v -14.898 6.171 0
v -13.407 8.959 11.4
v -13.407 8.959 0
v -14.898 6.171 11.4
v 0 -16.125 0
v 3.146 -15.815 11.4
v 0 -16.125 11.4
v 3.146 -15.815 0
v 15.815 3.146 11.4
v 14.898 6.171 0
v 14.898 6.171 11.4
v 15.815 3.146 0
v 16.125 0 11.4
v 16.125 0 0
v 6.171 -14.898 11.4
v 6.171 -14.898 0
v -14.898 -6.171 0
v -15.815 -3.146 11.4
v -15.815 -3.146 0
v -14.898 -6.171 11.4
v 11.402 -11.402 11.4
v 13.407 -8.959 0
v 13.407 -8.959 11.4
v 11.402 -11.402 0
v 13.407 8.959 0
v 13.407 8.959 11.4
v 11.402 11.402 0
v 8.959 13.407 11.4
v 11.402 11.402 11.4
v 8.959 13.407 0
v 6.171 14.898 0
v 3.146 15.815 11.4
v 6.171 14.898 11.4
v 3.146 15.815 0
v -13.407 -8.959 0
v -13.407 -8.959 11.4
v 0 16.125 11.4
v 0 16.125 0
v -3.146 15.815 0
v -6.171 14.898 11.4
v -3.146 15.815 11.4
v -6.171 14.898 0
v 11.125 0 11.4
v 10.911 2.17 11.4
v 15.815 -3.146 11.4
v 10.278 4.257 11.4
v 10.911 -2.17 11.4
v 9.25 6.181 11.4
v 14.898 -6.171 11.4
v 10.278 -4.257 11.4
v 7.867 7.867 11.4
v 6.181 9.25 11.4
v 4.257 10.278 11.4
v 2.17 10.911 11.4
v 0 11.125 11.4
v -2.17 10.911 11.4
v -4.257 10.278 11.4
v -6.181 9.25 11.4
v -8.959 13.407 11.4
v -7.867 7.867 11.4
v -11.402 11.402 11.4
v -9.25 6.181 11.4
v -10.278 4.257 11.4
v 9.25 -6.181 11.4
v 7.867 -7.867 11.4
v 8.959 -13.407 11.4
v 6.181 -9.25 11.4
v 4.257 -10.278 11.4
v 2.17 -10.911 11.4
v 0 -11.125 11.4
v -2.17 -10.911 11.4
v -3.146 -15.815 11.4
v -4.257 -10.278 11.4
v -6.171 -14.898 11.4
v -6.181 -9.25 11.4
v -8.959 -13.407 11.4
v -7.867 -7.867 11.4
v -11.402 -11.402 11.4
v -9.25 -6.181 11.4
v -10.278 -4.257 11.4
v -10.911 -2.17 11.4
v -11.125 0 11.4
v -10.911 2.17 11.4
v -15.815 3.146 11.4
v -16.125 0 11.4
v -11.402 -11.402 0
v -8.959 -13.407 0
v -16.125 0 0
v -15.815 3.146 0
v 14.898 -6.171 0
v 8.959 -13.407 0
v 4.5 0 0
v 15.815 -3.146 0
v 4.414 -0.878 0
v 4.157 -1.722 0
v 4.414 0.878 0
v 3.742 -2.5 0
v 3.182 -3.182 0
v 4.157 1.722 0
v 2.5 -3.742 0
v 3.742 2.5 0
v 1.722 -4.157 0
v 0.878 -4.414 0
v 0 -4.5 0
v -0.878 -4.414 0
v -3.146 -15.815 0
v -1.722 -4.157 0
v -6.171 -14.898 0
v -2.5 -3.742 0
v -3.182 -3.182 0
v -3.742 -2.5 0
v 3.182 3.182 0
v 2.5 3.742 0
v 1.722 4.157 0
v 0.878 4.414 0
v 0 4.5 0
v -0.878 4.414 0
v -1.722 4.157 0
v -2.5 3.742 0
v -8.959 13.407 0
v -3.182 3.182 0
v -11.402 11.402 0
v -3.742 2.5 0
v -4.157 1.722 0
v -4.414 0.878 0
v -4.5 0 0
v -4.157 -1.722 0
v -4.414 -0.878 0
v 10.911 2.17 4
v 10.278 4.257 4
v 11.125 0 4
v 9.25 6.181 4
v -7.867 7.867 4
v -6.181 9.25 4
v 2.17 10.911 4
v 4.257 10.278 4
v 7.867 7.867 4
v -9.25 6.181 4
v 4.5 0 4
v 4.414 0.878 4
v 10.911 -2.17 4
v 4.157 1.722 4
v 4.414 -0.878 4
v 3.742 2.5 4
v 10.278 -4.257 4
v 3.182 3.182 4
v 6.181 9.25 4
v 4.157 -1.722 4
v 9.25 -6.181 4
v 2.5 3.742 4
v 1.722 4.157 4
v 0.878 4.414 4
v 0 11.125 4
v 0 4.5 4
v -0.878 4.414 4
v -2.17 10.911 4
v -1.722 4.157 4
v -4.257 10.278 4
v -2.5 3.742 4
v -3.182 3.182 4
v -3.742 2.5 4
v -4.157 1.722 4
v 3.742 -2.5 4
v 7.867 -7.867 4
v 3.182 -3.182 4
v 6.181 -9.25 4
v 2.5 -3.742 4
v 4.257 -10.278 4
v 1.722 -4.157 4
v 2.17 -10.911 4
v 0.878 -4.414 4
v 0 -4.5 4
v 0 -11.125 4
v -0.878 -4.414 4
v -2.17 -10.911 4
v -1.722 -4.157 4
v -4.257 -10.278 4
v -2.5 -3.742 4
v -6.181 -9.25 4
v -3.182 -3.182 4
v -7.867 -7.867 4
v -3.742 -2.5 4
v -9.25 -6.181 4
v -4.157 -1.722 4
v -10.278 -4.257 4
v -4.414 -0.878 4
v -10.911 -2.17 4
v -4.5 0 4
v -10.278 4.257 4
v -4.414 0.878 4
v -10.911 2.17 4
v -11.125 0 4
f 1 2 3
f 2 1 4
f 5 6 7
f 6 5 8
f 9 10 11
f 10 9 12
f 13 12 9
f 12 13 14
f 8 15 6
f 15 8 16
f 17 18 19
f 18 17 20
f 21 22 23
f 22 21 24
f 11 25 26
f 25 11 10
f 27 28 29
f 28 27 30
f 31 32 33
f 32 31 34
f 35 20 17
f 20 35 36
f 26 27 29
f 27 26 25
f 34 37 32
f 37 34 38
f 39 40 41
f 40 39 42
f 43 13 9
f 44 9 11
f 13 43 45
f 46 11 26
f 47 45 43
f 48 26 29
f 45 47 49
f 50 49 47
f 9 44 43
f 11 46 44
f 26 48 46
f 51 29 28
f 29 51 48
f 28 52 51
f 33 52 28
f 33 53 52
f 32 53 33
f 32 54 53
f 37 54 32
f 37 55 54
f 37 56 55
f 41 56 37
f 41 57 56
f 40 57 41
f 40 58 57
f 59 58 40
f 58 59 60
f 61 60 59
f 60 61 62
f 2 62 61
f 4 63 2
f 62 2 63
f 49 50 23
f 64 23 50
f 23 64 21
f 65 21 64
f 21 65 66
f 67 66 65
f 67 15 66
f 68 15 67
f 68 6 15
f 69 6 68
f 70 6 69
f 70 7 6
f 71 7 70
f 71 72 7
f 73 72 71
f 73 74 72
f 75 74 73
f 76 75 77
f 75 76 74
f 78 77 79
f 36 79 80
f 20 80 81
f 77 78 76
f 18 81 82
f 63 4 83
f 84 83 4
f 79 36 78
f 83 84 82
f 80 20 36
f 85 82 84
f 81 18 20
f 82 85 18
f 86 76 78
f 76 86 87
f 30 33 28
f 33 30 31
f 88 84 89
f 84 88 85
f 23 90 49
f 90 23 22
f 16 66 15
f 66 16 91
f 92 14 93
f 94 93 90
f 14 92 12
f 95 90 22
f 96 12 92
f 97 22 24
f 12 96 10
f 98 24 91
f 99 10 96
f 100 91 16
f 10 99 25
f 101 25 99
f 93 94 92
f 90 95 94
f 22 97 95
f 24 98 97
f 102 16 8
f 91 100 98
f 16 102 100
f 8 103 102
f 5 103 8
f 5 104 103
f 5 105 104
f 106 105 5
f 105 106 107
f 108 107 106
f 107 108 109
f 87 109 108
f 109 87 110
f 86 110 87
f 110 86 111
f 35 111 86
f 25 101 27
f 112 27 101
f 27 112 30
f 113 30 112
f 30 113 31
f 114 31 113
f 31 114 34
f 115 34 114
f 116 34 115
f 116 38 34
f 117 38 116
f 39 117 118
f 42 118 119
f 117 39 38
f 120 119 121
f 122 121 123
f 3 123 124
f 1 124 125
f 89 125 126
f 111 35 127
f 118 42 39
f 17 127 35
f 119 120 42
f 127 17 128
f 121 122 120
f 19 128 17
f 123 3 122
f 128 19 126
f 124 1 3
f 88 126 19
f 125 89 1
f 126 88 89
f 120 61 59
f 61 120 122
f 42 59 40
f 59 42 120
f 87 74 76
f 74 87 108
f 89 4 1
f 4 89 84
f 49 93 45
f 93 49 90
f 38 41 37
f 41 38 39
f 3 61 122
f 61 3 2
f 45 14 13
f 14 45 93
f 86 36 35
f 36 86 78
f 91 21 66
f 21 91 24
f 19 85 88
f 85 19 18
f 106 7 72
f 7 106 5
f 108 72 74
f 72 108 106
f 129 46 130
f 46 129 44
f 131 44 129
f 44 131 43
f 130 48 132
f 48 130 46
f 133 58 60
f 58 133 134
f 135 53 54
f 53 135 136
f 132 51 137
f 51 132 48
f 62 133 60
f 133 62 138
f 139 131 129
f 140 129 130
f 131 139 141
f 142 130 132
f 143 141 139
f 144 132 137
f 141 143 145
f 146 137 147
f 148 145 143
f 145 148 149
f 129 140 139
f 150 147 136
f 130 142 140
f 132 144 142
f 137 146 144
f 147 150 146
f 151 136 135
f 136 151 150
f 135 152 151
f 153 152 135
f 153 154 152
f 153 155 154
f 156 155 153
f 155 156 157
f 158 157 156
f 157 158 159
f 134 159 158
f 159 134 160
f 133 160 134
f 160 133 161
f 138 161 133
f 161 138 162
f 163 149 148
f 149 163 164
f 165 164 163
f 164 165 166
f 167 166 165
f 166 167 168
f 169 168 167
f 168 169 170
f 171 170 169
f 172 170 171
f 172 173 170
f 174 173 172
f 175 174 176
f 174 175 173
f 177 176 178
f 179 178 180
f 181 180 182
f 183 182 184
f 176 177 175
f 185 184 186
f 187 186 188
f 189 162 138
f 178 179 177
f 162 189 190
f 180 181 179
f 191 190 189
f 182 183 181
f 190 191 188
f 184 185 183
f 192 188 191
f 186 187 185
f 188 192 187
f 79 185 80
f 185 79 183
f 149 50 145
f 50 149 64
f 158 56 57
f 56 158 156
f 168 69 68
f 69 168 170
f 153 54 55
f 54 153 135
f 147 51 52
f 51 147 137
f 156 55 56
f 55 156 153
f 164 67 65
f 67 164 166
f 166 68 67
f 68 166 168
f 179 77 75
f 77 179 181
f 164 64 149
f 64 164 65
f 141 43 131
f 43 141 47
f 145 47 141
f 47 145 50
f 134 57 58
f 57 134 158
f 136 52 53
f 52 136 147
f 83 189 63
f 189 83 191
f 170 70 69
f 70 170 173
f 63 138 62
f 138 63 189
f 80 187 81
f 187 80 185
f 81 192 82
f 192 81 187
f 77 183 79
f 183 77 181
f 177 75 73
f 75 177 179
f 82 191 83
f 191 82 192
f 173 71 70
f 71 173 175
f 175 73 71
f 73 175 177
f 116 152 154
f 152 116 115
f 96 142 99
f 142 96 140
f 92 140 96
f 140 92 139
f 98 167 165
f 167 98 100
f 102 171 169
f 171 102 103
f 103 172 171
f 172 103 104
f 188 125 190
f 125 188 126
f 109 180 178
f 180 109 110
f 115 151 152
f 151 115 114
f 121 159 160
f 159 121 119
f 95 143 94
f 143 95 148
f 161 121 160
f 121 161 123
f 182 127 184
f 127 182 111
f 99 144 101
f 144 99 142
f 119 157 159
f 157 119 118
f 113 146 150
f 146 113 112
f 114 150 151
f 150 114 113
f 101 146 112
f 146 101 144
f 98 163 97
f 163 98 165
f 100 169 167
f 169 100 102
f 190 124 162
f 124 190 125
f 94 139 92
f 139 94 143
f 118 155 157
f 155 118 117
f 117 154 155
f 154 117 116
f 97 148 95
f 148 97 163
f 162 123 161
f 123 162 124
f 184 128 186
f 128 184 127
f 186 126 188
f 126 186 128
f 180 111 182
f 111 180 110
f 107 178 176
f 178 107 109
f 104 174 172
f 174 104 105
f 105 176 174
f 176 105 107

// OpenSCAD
$fn = 32;

// ----------------------------------------------------------------------
// Bearing housing: seat for 608 (22 x 7 mm), 32.25 mm body
// ----------------------------------------------------------------------

// --- parameters (mm) ---
housing_d = 32.25;        // housing outside diameter
housing_h = 11.4;         // overall housing height
wall_t = 5;               // wall thickness
seat_d = 22.25;           // 608 seat, 0.25 mm clearance
seat_h = 7.4;             // pocket depth
shoulder = 4;             // shoulder under the bearing
pass_d = 9;               // shaft passage

module body() {
  cylinder(h = housing_h, d = housing_d);
}

difference() {
  union() {
    body();
  }
  translate([0, 0, housing_h - seat_h]) cylinder(h = seat_h + 1, d = seat_d);
  translate([0, 0, -1]) cylinder(h = housing_h - seat_h + 1, d = pass_d);
}
